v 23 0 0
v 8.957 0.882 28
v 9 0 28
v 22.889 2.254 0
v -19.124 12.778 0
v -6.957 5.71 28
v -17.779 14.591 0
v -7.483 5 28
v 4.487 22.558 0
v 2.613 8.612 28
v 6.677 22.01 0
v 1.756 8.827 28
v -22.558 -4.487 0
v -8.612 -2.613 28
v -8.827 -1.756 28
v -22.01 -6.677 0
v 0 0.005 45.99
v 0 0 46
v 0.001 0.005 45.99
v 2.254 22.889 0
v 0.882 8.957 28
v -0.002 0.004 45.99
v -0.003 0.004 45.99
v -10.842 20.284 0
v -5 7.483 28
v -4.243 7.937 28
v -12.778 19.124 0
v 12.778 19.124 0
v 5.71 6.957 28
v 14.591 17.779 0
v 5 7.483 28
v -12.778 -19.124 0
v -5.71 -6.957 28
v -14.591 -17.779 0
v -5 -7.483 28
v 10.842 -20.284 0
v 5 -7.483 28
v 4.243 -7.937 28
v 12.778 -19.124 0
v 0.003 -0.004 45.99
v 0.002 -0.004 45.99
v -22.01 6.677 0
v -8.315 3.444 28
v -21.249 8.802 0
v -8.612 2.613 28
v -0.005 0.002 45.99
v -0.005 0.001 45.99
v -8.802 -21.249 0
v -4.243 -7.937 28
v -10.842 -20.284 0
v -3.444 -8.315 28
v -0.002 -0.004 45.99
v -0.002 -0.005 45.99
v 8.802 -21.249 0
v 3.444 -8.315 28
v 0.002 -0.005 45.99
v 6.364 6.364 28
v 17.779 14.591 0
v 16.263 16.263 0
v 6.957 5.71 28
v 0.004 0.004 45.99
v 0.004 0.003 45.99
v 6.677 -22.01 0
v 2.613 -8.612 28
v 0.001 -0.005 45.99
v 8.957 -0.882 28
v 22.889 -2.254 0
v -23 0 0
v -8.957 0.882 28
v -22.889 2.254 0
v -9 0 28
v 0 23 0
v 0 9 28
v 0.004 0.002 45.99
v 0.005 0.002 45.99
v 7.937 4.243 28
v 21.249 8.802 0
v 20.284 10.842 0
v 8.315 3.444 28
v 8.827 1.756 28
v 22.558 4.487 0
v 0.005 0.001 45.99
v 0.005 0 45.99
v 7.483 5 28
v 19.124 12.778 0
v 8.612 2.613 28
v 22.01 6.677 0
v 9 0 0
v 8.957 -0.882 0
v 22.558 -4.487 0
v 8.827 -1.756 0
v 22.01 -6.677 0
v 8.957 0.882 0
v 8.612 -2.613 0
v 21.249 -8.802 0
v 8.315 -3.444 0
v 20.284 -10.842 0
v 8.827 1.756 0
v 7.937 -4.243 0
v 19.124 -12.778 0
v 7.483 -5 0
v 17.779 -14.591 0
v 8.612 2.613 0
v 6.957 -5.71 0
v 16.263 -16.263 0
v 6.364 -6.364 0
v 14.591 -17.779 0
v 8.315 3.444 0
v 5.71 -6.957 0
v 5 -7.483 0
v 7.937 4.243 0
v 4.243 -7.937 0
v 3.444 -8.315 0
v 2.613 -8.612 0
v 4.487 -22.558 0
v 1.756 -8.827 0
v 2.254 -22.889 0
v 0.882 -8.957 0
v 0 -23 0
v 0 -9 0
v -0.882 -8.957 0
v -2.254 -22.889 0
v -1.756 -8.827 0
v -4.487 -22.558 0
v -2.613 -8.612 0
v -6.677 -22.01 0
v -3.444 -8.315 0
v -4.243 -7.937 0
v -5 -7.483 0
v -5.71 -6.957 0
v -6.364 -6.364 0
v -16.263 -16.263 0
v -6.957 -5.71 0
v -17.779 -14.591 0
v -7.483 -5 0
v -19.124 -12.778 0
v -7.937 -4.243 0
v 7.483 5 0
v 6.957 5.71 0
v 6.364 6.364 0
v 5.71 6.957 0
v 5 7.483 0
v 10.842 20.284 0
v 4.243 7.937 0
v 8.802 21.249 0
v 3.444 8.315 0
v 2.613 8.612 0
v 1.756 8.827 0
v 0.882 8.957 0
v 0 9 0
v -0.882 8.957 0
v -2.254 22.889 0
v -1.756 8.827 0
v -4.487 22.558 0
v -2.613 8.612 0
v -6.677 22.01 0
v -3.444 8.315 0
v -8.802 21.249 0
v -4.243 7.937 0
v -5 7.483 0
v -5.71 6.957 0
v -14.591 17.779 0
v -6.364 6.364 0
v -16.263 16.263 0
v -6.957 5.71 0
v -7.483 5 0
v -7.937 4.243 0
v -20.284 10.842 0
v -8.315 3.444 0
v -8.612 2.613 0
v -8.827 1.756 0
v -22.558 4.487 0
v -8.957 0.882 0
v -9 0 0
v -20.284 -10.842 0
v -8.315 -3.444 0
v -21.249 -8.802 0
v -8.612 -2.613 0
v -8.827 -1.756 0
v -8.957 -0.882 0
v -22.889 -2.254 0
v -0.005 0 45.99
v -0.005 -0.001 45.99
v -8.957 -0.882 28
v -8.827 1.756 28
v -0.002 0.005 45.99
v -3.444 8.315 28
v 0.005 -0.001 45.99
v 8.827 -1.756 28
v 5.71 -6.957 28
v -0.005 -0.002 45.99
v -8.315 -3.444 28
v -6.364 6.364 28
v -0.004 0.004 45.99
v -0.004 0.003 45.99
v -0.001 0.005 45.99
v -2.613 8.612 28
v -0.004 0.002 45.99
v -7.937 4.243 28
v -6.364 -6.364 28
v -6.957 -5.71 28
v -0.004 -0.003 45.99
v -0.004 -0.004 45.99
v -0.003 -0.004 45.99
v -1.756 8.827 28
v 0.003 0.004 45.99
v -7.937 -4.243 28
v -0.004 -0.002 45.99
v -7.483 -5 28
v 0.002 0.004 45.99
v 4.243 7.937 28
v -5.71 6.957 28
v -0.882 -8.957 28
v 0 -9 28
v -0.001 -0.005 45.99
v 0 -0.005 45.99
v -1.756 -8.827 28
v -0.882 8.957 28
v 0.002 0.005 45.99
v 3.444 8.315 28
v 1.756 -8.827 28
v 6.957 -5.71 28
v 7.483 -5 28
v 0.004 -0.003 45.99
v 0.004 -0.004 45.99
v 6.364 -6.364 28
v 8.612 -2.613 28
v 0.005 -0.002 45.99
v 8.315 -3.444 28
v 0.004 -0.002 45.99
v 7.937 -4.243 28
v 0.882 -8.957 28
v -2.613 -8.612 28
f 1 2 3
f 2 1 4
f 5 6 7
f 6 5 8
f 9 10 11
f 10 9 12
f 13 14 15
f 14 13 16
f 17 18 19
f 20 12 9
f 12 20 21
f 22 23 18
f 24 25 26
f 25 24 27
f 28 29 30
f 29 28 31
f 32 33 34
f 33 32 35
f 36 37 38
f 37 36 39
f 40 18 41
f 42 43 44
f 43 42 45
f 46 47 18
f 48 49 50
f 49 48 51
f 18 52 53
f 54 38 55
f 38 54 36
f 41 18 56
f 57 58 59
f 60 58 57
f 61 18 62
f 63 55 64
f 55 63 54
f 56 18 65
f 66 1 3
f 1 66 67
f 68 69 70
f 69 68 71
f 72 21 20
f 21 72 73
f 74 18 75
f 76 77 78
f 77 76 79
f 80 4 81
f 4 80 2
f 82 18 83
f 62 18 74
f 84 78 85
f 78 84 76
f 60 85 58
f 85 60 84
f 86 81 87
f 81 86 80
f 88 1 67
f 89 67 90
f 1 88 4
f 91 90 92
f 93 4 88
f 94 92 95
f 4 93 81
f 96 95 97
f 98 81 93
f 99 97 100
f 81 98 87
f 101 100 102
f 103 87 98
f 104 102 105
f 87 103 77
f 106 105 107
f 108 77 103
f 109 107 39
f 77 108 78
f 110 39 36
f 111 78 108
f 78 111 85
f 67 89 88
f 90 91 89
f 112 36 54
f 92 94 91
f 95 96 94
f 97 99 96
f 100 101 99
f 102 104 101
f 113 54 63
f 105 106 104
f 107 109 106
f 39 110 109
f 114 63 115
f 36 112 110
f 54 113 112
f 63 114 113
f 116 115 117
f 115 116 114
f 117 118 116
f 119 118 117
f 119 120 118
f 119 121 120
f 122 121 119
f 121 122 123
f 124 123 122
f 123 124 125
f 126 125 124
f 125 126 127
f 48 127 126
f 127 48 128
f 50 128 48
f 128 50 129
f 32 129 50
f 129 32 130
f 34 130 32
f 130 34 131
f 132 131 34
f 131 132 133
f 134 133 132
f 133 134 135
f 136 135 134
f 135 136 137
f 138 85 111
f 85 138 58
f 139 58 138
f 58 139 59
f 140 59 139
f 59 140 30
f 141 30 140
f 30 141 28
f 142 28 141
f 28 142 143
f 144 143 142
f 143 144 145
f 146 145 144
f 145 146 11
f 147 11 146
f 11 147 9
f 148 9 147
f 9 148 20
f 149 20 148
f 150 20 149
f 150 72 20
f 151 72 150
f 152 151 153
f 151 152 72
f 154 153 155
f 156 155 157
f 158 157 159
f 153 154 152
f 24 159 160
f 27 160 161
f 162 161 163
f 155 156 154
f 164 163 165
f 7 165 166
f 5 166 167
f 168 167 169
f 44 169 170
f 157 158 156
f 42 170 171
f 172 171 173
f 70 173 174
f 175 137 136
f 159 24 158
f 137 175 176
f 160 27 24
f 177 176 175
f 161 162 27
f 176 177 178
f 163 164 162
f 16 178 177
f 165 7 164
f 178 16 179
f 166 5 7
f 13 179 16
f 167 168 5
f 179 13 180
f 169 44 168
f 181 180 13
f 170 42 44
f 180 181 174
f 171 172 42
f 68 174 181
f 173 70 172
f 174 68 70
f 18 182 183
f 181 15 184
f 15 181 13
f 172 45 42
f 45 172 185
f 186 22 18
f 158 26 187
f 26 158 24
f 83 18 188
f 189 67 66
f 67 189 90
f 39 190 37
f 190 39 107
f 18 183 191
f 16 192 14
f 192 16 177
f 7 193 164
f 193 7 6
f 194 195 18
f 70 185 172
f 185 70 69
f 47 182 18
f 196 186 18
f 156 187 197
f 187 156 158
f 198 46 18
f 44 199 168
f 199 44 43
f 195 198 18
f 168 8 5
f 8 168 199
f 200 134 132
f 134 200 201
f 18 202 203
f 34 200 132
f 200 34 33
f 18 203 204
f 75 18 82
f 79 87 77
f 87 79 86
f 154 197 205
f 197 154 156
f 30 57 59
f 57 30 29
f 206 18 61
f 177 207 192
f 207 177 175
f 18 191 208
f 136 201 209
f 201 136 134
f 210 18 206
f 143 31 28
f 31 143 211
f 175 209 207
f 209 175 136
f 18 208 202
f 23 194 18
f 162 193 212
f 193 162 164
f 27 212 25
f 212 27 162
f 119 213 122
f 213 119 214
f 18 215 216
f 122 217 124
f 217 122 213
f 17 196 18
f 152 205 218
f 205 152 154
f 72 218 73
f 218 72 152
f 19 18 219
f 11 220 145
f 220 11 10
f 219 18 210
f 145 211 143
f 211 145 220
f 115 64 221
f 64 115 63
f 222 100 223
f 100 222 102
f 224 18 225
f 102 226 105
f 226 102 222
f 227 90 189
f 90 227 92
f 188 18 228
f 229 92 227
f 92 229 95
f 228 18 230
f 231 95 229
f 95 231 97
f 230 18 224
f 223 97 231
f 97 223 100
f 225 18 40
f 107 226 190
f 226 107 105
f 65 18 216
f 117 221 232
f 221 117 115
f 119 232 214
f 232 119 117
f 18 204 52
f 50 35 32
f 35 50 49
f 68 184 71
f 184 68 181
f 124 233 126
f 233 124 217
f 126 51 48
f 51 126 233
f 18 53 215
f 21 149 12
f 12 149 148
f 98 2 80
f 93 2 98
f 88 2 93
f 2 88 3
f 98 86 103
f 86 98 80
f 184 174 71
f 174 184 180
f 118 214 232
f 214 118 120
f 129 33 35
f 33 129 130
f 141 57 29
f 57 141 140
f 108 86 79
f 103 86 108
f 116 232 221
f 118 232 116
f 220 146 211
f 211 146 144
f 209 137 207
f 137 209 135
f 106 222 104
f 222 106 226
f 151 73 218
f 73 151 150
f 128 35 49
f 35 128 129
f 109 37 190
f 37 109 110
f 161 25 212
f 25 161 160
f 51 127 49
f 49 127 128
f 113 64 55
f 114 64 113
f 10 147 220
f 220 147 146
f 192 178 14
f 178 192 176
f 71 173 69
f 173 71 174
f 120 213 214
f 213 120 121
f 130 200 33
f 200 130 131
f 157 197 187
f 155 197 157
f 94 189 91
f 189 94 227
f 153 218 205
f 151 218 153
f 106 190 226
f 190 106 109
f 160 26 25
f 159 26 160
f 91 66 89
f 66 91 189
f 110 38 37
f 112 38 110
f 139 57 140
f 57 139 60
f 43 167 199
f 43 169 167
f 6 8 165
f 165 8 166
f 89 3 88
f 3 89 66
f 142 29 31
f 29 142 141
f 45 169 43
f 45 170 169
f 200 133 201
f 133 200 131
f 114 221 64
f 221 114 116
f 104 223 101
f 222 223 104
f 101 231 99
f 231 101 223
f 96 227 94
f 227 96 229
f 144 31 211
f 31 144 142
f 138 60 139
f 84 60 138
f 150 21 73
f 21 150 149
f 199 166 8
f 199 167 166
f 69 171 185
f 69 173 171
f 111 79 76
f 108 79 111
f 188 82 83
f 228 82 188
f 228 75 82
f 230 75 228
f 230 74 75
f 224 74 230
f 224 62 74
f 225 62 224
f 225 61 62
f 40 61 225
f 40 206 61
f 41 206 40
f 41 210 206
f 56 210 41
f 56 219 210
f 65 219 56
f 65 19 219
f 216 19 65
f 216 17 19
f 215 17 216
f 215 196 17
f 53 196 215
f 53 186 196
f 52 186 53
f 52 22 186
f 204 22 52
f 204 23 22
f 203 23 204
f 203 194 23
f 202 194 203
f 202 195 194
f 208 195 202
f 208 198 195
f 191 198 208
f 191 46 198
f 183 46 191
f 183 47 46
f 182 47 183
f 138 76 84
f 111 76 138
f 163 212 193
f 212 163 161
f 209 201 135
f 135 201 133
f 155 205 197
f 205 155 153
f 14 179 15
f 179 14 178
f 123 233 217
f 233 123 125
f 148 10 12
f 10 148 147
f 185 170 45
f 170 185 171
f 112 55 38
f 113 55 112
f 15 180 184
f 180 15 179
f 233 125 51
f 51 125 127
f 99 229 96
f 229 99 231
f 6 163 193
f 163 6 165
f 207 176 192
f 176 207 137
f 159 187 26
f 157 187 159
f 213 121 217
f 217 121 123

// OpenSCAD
$fn = 64;
eps = 0.01;

difference() {
    cylinder(r1=23, r2=0, h=46);
    
    translate([0, 0, -eps]) {
        cylinder(r=9, h=46);
    }
}
